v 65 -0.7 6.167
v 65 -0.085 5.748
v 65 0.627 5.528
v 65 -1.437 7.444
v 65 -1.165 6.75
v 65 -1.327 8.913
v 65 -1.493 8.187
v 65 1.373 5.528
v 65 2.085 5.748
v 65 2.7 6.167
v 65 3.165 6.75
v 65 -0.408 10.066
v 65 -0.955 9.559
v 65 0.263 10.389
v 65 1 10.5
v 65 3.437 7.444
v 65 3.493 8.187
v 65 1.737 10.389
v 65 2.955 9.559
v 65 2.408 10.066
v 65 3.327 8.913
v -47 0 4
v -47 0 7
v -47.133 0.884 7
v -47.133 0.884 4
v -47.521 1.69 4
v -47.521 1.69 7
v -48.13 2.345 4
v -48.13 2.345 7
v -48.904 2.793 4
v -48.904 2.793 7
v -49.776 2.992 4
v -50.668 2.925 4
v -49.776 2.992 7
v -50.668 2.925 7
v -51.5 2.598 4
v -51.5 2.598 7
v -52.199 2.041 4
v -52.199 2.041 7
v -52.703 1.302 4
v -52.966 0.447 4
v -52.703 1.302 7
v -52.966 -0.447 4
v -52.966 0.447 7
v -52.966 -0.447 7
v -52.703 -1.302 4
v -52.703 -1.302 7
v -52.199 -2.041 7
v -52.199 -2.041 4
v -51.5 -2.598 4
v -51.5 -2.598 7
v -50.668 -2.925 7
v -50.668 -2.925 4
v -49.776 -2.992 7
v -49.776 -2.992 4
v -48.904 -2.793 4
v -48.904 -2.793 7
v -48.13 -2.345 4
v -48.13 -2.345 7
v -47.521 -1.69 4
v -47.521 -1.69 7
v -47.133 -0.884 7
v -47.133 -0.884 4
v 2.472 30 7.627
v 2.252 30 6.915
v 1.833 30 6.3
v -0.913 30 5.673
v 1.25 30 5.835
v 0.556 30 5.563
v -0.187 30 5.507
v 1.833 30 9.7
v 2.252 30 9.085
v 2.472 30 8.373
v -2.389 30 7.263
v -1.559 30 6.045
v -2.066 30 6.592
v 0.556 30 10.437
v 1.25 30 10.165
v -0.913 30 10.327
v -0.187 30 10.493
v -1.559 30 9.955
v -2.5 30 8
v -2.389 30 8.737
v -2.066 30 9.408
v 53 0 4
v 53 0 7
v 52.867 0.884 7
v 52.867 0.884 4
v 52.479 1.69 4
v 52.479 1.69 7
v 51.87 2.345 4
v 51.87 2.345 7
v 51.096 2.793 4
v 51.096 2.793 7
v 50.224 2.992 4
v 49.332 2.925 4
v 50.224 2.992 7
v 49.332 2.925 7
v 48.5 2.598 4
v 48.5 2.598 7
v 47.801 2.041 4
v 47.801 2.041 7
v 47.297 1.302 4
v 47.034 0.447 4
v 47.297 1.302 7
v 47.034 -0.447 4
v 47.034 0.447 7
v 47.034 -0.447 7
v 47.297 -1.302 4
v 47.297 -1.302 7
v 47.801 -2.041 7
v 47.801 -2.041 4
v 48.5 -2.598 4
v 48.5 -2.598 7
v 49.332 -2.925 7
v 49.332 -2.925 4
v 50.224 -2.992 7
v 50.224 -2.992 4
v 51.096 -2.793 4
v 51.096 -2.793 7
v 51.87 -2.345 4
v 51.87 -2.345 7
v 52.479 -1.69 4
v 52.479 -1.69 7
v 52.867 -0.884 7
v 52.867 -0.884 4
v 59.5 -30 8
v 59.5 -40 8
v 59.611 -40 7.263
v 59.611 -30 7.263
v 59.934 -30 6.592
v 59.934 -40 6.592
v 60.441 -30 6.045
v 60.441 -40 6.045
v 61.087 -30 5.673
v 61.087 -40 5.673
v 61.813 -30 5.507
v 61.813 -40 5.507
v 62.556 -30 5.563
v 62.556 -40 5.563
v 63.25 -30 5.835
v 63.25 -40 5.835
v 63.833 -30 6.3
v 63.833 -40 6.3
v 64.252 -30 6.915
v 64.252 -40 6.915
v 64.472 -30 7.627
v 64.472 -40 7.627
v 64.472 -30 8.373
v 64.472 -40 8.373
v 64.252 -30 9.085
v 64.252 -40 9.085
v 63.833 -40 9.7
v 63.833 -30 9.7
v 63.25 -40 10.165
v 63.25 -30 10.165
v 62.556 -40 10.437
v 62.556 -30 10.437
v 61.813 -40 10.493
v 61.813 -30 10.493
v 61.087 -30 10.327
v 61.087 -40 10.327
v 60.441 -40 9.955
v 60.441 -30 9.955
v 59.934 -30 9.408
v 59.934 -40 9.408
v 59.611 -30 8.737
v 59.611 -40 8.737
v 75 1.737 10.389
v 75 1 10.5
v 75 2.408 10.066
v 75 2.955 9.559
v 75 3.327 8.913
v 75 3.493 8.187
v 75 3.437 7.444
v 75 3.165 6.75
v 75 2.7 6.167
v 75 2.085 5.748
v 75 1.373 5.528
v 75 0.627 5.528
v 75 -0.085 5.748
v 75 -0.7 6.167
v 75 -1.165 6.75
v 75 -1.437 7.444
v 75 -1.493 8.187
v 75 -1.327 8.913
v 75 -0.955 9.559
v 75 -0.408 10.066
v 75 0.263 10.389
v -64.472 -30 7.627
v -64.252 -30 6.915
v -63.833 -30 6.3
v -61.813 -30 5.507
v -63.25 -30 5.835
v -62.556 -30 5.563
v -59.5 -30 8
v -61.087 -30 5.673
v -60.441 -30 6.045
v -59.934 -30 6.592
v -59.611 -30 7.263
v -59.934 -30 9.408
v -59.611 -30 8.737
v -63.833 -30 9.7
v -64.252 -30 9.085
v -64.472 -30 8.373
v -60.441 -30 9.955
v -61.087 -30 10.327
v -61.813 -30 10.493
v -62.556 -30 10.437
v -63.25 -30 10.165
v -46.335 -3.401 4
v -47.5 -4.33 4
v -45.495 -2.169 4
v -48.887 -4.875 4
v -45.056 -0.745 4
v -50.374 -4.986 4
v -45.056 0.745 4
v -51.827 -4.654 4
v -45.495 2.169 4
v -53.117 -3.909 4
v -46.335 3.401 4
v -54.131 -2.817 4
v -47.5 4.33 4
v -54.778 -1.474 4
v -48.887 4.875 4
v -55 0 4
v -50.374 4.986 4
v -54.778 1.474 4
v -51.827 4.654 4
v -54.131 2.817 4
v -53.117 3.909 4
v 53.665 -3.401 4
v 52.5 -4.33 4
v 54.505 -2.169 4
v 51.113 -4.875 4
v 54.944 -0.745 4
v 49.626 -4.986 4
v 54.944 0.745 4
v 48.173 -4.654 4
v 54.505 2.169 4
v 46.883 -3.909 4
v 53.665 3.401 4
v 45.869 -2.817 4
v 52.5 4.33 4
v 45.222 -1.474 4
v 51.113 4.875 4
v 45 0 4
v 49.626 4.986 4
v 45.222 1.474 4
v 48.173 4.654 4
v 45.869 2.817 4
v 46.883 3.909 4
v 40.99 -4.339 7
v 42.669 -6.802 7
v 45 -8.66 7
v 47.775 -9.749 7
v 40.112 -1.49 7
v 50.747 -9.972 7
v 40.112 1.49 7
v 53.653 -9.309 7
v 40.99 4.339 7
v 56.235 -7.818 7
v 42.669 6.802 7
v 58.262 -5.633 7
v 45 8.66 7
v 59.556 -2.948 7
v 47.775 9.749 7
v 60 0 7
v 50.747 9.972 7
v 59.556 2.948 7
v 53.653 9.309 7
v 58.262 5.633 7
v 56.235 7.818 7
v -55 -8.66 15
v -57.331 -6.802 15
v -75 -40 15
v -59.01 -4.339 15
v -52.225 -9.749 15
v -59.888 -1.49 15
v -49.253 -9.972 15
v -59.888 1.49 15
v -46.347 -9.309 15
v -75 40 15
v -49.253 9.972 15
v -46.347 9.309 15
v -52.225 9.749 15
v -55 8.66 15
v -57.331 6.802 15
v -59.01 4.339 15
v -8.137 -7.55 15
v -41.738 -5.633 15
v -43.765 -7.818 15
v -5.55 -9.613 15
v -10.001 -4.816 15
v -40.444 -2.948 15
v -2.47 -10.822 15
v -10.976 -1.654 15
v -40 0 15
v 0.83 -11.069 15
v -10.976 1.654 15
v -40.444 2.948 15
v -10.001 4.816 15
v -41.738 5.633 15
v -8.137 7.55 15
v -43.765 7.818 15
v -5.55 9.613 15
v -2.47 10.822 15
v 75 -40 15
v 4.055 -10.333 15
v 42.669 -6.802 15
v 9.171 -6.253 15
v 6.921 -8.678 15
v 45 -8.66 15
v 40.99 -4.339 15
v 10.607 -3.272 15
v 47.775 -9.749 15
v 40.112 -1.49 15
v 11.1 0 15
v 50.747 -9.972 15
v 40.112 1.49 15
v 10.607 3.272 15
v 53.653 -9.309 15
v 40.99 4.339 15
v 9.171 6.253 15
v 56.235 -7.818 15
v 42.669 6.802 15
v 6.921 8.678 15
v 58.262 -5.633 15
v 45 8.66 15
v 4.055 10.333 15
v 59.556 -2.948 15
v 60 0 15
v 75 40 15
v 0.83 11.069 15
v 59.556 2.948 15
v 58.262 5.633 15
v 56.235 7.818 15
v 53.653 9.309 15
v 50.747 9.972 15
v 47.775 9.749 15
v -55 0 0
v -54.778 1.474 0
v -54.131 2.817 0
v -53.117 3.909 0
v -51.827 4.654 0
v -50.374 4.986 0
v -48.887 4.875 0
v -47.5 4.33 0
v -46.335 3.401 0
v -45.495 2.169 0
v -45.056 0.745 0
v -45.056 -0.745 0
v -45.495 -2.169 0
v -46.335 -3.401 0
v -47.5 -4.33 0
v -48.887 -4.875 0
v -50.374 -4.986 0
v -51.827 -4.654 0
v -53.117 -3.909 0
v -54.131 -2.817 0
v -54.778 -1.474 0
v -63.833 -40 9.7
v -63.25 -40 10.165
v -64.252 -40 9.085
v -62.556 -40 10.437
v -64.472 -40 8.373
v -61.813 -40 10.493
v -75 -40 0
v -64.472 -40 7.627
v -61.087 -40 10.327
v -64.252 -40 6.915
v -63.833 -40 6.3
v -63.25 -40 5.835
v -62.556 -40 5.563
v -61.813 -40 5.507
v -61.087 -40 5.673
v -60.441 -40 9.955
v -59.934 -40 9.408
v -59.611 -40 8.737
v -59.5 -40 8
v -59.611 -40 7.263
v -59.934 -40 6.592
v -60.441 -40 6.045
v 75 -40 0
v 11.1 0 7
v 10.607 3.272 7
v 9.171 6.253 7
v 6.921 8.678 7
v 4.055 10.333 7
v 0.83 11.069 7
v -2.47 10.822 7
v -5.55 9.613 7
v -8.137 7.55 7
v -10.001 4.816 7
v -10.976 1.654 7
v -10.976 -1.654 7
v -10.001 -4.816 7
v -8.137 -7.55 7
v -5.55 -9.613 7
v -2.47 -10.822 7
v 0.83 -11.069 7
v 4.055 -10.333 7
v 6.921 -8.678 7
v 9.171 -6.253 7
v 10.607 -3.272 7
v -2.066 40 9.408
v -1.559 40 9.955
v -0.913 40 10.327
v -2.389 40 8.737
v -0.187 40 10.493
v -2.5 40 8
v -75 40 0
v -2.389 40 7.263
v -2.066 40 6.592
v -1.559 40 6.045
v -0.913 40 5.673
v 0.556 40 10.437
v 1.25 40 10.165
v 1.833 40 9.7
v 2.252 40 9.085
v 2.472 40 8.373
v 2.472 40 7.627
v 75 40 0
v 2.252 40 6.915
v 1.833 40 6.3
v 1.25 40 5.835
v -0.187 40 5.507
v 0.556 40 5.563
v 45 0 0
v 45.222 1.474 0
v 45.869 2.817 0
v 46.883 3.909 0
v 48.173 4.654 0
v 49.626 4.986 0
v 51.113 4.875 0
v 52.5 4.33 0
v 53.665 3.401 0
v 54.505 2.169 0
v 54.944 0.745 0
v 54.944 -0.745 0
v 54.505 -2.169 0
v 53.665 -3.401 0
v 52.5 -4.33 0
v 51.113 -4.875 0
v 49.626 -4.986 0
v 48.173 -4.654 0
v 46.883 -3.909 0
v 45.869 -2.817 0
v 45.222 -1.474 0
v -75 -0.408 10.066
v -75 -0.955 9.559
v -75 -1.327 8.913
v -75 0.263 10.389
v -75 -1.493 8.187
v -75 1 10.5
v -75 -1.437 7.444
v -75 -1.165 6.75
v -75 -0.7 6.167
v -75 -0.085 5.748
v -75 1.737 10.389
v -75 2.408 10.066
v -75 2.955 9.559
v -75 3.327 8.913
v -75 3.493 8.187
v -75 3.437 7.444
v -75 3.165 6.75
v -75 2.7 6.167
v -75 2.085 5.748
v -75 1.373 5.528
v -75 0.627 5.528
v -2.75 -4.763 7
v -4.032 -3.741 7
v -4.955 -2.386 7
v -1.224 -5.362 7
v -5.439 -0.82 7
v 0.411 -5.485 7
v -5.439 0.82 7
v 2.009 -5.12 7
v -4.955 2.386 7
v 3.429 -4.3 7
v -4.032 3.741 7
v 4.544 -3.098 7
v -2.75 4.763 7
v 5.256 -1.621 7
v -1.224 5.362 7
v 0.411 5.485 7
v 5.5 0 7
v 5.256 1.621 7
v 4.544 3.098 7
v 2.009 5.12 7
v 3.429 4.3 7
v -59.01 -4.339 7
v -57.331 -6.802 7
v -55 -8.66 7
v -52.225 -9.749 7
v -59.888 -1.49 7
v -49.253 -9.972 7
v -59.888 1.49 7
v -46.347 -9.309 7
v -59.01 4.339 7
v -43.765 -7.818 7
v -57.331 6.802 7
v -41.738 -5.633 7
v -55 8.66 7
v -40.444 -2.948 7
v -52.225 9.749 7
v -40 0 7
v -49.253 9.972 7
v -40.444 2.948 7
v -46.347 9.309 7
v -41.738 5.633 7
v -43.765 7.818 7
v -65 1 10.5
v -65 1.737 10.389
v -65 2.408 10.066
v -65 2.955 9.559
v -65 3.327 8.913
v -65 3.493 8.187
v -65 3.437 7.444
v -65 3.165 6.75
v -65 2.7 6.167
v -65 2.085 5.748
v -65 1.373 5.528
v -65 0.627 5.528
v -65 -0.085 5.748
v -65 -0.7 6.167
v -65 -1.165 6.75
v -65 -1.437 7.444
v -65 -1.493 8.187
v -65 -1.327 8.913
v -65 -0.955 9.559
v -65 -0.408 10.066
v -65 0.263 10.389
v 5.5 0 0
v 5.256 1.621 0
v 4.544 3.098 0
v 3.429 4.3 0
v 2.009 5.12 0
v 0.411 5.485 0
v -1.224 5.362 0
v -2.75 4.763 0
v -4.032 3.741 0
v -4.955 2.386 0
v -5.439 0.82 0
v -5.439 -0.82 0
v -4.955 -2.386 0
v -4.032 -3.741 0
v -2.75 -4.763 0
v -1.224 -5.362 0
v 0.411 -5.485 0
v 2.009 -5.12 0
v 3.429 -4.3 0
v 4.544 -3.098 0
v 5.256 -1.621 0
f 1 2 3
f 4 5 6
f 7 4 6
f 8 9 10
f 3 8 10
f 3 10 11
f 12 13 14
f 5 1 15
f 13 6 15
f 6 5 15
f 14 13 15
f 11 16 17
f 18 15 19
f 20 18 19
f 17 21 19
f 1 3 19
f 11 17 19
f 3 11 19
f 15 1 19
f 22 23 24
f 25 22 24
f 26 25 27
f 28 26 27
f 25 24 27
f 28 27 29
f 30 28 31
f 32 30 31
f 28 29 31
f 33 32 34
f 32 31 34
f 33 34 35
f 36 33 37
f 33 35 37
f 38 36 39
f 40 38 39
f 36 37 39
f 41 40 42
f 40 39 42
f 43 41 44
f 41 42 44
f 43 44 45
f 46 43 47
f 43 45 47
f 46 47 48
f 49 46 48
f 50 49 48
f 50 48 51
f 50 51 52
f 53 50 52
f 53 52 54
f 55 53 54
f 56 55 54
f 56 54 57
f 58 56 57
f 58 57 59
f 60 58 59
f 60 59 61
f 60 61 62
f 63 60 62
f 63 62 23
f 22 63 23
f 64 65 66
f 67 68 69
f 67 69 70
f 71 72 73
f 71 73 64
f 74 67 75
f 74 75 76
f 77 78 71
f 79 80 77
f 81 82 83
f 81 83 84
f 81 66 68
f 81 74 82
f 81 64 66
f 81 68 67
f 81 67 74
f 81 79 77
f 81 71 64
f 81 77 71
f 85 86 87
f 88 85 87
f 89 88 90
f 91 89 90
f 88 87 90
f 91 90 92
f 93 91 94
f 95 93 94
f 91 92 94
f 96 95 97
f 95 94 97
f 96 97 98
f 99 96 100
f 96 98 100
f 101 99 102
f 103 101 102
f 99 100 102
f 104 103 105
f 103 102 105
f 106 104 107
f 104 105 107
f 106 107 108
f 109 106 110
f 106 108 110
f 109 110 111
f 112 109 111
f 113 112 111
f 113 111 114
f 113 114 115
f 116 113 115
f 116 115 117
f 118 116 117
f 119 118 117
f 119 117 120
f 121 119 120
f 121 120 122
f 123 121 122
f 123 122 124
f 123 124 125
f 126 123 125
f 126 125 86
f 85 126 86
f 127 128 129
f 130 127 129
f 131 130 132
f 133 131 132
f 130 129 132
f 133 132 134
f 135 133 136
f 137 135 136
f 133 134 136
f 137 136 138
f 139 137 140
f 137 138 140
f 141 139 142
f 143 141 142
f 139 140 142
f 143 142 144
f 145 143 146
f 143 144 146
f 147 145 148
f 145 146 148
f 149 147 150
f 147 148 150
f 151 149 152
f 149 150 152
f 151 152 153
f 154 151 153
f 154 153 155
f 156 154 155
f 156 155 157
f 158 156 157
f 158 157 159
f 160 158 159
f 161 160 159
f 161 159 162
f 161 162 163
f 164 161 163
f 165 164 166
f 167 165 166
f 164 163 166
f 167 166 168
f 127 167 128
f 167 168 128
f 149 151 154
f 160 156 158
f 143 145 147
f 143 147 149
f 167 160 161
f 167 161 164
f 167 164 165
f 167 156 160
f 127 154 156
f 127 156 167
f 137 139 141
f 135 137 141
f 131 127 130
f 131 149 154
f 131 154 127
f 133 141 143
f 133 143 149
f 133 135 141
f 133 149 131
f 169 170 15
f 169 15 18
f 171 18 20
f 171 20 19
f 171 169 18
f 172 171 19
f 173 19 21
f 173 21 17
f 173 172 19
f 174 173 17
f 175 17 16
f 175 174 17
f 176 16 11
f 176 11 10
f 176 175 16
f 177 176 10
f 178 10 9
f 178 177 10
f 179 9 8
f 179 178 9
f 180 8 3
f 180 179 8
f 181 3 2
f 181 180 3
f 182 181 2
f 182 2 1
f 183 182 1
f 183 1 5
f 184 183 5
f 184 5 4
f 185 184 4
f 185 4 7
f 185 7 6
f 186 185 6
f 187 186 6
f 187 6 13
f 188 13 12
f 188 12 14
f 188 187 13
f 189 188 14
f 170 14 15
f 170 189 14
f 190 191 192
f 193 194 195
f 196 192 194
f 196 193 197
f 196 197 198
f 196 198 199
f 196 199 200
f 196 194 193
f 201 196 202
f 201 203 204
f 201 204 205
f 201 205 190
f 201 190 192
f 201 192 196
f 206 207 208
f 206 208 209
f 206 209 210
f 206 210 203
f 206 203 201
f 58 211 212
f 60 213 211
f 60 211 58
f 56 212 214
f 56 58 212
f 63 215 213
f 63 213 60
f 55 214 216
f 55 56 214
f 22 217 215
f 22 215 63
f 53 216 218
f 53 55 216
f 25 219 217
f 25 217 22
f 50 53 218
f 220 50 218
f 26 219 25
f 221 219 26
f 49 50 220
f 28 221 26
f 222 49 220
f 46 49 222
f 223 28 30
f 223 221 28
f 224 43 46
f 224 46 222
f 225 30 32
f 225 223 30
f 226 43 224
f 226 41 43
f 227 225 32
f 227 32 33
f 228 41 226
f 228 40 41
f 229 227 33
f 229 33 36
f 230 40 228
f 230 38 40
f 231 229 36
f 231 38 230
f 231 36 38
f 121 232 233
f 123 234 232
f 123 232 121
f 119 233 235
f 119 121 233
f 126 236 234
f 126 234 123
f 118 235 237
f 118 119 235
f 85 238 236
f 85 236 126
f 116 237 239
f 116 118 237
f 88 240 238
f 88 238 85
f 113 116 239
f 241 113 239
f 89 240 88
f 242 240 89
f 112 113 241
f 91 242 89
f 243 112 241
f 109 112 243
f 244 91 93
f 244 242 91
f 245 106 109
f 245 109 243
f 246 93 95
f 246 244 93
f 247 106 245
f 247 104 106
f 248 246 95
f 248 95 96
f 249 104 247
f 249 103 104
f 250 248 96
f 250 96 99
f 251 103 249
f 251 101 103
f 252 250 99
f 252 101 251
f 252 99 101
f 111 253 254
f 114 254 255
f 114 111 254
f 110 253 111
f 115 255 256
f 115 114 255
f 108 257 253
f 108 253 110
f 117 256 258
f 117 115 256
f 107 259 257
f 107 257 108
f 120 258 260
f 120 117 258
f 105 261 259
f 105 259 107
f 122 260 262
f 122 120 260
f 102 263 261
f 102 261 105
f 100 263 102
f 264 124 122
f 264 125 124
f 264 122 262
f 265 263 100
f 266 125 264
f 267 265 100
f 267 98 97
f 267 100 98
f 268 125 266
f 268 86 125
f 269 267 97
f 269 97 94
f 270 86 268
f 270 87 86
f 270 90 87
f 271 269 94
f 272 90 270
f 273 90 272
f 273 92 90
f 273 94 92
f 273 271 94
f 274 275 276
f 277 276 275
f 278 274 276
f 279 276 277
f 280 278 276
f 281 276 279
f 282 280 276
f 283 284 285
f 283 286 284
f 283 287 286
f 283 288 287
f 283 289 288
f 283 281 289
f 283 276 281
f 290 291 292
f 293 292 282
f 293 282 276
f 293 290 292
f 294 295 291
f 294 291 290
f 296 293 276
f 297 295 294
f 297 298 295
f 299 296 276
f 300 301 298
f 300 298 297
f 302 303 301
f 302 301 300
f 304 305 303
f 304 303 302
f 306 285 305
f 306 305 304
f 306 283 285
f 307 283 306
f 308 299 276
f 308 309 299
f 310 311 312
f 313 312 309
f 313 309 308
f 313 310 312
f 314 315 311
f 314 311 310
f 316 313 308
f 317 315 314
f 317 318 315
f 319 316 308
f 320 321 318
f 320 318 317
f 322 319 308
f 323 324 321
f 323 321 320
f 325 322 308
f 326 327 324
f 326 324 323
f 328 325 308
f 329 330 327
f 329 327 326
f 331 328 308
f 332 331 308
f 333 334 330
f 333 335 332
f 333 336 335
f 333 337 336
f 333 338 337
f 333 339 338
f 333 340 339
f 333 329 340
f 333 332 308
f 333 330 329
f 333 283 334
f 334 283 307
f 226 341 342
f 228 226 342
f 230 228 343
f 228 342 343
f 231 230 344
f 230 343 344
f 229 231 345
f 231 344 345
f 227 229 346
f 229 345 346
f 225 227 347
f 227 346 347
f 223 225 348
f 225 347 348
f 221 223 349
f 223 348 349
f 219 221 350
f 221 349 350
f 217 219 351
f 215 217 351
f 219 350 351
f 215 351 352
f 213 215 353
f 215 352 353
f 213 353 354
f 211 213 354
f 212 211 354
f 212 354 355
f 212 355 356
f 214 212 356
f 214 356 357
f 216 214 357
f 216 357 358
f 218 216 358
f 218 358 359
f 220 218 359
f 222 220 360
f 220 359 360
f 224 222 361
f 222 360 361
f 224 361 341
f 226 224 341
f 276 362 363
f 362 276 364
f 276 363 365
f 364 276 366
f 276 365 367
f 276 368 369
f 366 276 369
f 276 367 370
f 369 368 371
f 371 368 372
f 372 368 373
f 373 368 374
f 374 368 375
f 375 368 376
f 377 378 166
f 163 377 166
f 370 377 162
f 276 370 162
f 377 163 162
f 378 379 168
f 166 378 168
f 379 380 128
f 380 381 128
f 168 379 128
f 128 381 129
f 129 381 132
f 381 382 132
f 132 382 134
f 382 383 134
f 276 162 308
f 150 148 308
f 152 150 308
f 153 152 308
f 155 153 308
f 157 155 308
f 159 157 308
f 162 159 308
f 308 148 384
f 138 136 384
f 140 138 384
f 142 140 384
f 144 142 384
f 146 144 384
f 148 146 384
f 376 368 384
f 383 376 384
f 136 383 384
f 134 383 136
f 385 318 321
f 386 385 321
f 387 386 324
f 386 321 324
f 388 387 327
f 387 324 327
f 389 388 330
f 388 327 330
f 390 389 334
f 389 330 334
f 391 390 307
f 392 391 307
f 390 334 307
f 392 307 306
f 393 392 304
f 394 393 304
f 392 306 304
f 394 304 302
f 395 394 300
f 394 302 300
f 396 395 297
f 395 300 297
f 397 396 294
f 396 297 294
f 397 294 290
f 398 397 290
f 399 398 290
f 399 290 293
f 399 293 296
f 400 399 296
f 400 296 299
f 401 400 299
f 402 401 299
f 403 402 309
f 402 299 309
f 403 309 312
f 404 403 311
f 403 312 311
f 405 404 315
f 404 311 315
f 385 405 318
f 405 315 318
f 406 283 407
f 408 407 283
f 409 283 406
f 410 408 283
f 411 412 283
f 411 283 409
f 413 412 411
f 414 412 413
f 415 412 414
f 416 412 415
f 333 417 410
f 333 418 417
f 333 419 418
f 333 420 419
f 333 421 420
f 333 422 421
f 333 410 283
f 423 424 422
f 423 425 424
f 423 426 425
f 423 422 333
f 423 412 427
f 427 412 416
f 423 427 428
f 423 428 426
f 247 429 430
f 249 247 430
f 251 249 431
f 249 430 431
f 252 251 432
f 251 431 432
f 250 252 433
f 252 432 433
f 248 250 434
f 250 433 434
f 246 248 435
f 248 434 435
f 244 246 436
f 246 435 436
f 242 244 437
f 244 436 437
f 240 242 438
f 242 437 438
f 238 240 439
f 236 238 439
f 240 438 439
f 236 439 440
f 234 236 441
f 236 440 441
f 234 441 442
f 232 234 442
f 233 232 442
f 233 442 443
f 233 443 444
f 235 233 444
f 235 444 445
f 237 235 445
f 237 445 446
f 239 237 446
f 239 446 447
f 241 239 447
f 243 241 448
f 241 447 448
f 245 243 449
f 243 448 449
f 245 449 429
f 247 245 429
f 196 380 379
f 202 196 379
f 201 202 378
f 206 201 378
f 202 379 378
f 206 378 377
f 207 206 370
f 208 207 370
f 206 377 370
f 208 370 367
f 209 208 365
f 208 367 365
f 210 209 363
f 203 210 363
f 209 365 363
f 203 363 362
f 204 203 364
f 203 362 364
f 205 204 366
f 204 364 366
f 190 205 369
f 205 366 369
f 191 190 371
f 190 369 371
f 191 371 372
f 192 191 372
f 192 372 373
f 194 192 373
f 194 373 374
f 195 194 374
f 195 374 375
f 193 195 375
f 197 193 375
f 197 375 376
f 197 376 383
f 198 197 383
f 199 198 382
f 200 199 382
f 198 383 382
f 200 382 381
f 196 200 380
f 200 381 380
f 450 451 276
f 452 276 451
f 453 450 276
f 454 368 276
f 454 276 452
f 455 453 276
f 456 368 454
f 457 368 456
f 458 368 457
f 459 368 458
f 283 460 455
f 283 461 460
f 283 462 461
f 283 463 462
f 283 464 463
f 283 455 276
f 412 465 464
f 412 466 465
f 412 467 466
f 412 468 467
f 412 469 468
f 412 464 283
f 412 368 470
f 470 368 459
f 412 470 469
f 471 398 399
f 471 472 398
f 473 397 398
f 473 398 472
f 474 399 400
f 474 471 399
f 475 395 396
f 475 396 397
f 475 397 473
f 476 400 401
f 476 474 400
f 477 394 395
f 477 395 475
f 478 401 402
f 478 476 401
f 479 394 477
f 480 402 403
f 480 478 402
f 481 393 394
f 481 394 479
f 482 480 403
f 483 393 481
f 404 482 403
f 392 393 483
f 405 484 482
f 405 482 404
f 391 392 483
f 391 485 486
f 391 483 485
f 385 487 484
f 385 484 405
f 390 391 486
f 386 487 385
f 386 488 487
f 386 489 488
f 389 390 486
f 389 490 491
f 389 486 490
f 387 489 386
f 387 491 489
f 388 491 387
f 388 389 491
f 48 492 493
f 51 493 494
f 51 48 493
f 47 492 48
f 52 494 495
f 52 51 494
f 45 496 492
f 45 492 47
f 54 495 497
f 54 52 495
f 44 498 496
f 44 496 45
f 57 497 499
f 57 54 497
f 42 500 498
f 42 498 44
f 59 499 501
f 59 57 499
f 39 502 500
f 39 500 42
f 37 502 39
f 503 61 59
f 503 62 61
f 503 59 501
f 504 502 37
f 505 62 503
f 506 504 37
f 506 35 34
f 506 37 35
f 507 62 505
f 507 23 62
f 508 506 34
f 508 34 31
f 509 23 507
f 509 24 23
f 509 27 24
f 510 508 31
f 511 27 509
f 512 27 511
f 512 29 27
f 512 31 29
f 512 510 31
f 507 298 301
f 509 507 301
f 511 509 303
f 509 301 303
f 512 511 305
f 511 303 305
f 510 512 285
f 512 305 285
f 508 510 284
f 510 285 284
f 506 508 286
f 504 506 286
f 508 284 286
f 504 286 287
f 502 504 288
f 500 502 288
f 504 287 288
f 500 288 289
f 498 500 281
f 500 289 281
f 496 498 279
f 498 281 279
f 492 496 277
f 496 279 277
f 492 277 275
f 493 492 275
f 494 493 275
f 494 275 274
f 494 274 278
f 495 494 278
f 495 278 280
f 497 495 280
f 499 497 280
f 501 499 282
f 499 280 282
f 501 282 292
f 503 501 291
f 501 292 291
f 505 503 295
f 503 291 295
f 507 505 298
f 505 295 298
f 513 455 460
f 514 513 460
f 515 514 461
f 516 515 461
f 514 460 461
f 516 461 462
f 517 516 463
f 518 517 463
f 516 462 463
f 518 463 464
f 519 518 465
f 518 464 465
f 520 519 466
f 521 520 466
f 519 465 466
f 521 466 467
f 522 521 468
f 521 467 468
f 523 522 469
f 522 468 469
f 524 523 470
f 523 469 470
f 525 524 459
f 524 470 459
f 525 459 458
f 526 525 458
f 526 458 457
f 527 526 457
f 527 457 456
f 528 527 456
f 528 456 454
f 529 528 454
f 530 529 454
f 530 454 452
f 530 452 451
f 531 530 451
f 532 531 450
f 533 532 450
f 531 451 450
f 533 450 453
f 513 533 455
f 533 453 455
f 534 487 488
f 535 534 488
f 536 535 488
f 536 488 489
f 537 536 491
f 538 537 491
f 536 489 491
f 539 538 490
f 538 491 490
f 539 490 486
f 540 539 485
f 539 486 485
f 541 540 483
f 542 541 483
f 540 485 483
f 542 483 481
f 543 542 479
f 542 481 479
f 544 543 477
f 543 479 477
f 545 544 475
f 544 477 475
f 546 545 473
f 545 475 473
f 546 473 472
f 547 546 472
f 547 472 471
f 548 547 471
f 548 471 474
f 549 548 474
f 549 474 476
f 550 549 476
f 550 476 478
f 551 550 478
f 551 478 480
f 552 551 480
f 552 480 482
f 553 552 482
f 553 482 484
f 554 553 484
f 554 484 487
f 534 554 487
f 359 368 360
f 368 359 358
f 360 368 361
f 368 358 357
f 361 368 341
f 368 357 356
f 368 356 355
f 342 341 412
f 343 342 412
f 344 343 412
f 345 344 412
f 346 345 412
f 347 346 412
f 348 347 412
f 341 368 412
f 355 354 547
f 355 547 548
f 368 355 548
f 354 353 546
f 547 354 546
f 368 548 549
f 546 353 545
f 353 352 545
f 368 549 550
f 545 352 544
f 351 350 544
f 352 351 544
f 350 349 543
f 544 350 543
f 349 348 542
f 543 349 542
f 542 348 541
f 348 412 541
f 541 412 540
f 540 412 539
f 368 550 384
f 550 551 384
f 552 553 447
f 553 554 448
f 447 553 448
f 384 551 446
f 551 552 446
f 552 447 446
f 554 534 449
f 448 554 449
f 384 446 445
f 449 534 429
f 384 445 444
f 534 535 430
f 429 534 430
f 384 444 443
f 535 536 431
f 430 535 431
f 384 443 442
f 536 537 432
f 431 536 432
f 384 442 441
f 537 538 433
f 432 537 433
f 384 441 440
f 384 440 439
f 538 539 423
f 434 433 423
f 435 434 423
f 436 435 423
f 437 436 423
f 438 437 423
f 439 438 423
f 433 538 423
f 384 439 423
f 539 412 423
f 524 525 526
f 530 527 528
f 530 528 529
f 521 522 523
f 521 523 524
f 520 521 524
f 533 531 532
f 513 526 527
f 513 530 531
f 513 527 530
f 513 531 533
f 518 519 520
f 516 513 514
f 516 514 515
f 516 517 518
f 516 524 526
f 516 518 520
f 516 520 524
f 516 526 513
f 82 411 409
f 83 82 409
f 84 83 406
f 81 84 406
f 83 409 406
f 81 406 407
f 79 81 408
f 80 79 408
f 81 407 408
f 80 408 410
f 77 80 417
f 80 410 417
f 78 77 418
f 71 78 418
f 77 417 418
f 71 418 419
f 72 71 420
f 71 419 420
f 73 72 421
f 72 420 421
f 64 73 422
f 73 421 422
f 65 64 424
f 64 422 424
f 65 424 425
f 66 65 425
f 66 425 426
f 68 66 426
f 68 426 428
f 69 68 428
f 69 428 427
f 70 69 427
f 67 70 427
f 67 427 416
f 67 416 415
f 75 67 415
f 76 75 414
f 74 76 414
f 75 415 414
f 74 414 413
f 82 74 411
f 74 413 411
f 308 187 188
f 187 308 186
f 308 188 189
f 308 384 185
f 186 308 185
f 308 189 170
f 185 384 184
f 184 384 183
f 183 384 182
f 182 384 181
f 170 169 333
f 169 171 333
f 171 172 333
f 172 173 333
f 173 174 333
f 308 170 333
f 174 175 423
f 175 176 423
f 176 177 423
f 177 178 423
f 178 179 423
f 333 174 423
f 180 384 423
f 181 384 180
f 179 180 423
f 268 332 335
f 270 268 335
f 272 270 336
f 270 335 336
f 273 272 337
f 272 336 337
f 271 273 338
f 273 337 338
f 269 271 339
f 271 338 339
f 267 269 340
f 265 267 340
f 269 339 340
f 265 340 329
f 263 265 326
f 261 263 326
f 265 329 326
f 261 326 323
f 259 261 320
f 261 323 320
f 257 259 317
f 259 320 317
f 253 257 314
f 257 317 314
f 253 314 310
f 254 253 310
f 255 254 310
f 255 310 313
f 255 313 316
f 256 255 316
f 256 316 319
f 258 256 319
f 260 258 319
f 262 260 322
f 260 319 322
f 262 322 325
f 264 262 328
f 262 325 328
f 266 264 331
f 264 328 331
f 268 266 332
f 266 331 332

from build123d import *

# Parameters (mm, degrees)
SKETCH1_W           = 150
SKETCH1_H           = 80
BOSS_EXTRUDE1_DEPTH = 15
CUT_EXTRUDE1_REACH  = 88.313
SKETCH2_R           = 3
SKETCH2_R_2         = 5.5
SKETCH3_R           = 11.1
SKETCH3_R_2         = 10
CUT_EXTRUDE2_DEPTH  = 8
SKETCH5_R           = 5
CUT_EXTRUDE4_DEPTH  = 4
SKETCH6_R           = 2.5
CUT_EXTRUDE5_DEPTH  = 10
SKETCH7_R           = 2.5
CUT_EXTRUDE6_DEPTH  = 10
SKETCH8_R           = 2.5
CUT_EXTRUDE7_DEPTH  = 10


with BuildPart() as part:
    # Sketch1 → Boss-Extrude1 (new body)
    with BuildSketch(Plane.XY):
        Rectangle(SKETCH1_W, SKETCH1_H)
    extrude(amount=BOSS_EXTRUDE1_DEPTH)

    # Sketch2 → Cut-Extrude1 (cut, up to next)
    with BuildSketch(Plane.XY.offset(15), mode=Mode.PRIVATE) as cut_extrude1_sk1:
        with Locations((-50, 0)):
            Circle(SKETCH2_R)
    cut_extrude1_tool1 = extrude(cut_extrude1_sk1.sketch, amount=-CUT_EXTRUDE1_REACH, mode=Mode.PRIVATE) & part.part
    # Sketch2 → Cut-Extrude1 (cut, up to next)
    with BuildSketch(Plane.XY.offset(15), mode=Mode.PRIVATE) as cut_extrude1_sk2:
        with Locations((50, 0)):
            Circle(SKETCH2_R)
    cut_extrude1_tool2 = extrude(cut_extrude1_sk2.sketch, amount=-CUT_EXTRUDE1_REACH, mode=Mode.PRIVATE) & part.part
    # Sketch2 → Cut-Extrude1 (cut, up to next)
    with BuildSketch(Plane.XY.offset(15), mode=Mode.PRIVATE) as cut_extrude1_sk3:
        Circle(SKETCH2_R_2)
    cut_extrude1_tool3 = extrude(cut_extrude1_sk3.sketch, amount=-CUT_EXTRUDE1_REACH, mode=Mode.PRIVATE) & part.part
    add(cut_extrude1_tool1.solids().sort_by_distance((-50, 0, 15))[0], mode=Mode.SUBTRACT)
    add(cut_extrude1_tool2.solids().sort_by_distance((50, 0, 15))[0], mode=Mode.SUBTRACT)
    add(cut_extrude1_tool3.solids().sort_by_distance((0, 0, 15))[0], mode=Mode.SUBTRACT)

    # Sketch3 → Cut-Extrude2 (cut)
    with BuildSketch(Plane.XY.offset(15)):
        Circle(SKETCH3_R)
        with Locations((-50, 0)):
            Circle(SKETCH3_R_2)
        with Locations((50, 0)):
            Circle(SKETCH3_R_2)
    extrude(amount=-CUT_EXTRUDE2_DEPTH, mode=Mode.SUBTRACT)

    # Sketch5 → Cut-Extrude4 (cut)
    with BuildSketch(Plane(origin=(0, 0, 0), x_dir=(-1, 0, 0), z_dir=(0, 0, -1))):
        with Locations((-50, 0)):
            Circle(SKETCH5_R)
        with Locations((50, 0)):
            Circle(SKETCH5_R)
    extrude(amount=-CUT_EXTRUDE4_DEPTH, mode=Mode.SUBTRACT)

    # Sketch6 → Cut-Extrude5 (cut)
    with BuildSketch(Plane.ZY.offset(75)):
        with Locations((8, 1)):
            Circle(SKETCH6_R)
    cut_extrude5 = extrude(amount=-CUT_EXTRUDE5_DEPTH, mode=Mode.SUBTRACT)

    # Mirror1: Cut-Extrude5 across plane
    add(cut_extrude5.mirror(Plane(origin=(0, 0, 0), x_dir=(0, 0, 1), z_dir=(1, 0, 0))), mode=Mode.SUBTRACT)

    # Sketch7 → Cut-Extrude6 (cut)
    with BuildSketch(Plane.XZ.offset(40)):
        with Locations((-62, 8)):
            Circle(SKETCH7_R)
        with Locations(Location((62, 8, 0), (0, 0, 180))):
            Circle(SKETCH7_R)
    extrude(amount=-CUT_EXTRUDE6_DEPTH, mode=Mode.SUBTRACT)

    # Sketch8 → Cut-Extrude7 (cut)
    with BuildSketch(Plane(origin=(0, 40, 0), x_dir=(1, 0, 0), z_dir=(0, 1, 0))):
        with Locations(Location((0, -8, 0), (0, 0, 180))):
            Circle(SKETCH8_R)
    extrude(amount=-CUT_EXTRUDE7_DEPTH, mode=Mode.SUBTRACT)


solid = part.part
